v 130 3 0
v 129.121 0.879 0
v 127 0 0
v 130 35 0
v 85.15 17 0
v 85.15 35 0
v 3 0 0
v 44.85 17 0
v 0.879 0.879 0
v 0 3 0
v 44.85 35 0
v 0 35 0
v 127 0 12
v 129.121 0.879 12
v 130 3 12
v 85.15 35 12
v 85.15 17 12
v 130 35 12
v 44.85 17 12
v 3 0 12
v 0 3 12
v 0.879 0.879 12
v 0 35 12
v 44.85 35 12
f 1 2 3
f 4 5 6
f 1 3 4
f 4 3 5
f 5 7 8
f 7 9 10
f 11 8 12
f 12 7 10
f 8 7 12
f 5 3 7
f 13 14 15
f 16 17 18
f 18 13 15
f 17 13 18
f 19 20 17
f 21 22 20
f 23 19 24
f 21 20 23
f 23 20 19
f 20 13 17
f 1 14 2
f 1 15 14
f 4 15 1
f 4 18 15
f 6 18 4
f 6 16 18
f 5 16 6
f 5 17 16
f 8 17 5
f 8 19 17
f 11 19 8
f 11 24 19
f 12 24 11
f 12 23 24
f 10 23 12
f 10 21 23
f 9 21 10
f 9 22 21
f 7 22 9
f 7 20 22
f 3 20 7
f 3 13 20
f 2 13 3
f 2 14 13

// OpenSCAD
$fn = 32;

// ----------------------------------------------------------------------
// Window plate: 130 x 35 mm, 1 open windows
// ----------------------------------------------------------------------

// --- parameters (mm) ---
profile_height = 12;      // extrusion height
profile_points = 12;      // points of the closed outline

profile = [[0, 3], [0.879, 0.879], [3, 0], [127, 0], [129.121, 0.879], [130, 3], [130, 35], [85.15, 35], [85.15, 17], [44.85, 17], [44.85, 35], [0, 35]];  // single closed polygon, 12 points, counter clockwise

// --- the one profile operation ---
linear_extrude(height = profile_height) polygon(points = profile);
